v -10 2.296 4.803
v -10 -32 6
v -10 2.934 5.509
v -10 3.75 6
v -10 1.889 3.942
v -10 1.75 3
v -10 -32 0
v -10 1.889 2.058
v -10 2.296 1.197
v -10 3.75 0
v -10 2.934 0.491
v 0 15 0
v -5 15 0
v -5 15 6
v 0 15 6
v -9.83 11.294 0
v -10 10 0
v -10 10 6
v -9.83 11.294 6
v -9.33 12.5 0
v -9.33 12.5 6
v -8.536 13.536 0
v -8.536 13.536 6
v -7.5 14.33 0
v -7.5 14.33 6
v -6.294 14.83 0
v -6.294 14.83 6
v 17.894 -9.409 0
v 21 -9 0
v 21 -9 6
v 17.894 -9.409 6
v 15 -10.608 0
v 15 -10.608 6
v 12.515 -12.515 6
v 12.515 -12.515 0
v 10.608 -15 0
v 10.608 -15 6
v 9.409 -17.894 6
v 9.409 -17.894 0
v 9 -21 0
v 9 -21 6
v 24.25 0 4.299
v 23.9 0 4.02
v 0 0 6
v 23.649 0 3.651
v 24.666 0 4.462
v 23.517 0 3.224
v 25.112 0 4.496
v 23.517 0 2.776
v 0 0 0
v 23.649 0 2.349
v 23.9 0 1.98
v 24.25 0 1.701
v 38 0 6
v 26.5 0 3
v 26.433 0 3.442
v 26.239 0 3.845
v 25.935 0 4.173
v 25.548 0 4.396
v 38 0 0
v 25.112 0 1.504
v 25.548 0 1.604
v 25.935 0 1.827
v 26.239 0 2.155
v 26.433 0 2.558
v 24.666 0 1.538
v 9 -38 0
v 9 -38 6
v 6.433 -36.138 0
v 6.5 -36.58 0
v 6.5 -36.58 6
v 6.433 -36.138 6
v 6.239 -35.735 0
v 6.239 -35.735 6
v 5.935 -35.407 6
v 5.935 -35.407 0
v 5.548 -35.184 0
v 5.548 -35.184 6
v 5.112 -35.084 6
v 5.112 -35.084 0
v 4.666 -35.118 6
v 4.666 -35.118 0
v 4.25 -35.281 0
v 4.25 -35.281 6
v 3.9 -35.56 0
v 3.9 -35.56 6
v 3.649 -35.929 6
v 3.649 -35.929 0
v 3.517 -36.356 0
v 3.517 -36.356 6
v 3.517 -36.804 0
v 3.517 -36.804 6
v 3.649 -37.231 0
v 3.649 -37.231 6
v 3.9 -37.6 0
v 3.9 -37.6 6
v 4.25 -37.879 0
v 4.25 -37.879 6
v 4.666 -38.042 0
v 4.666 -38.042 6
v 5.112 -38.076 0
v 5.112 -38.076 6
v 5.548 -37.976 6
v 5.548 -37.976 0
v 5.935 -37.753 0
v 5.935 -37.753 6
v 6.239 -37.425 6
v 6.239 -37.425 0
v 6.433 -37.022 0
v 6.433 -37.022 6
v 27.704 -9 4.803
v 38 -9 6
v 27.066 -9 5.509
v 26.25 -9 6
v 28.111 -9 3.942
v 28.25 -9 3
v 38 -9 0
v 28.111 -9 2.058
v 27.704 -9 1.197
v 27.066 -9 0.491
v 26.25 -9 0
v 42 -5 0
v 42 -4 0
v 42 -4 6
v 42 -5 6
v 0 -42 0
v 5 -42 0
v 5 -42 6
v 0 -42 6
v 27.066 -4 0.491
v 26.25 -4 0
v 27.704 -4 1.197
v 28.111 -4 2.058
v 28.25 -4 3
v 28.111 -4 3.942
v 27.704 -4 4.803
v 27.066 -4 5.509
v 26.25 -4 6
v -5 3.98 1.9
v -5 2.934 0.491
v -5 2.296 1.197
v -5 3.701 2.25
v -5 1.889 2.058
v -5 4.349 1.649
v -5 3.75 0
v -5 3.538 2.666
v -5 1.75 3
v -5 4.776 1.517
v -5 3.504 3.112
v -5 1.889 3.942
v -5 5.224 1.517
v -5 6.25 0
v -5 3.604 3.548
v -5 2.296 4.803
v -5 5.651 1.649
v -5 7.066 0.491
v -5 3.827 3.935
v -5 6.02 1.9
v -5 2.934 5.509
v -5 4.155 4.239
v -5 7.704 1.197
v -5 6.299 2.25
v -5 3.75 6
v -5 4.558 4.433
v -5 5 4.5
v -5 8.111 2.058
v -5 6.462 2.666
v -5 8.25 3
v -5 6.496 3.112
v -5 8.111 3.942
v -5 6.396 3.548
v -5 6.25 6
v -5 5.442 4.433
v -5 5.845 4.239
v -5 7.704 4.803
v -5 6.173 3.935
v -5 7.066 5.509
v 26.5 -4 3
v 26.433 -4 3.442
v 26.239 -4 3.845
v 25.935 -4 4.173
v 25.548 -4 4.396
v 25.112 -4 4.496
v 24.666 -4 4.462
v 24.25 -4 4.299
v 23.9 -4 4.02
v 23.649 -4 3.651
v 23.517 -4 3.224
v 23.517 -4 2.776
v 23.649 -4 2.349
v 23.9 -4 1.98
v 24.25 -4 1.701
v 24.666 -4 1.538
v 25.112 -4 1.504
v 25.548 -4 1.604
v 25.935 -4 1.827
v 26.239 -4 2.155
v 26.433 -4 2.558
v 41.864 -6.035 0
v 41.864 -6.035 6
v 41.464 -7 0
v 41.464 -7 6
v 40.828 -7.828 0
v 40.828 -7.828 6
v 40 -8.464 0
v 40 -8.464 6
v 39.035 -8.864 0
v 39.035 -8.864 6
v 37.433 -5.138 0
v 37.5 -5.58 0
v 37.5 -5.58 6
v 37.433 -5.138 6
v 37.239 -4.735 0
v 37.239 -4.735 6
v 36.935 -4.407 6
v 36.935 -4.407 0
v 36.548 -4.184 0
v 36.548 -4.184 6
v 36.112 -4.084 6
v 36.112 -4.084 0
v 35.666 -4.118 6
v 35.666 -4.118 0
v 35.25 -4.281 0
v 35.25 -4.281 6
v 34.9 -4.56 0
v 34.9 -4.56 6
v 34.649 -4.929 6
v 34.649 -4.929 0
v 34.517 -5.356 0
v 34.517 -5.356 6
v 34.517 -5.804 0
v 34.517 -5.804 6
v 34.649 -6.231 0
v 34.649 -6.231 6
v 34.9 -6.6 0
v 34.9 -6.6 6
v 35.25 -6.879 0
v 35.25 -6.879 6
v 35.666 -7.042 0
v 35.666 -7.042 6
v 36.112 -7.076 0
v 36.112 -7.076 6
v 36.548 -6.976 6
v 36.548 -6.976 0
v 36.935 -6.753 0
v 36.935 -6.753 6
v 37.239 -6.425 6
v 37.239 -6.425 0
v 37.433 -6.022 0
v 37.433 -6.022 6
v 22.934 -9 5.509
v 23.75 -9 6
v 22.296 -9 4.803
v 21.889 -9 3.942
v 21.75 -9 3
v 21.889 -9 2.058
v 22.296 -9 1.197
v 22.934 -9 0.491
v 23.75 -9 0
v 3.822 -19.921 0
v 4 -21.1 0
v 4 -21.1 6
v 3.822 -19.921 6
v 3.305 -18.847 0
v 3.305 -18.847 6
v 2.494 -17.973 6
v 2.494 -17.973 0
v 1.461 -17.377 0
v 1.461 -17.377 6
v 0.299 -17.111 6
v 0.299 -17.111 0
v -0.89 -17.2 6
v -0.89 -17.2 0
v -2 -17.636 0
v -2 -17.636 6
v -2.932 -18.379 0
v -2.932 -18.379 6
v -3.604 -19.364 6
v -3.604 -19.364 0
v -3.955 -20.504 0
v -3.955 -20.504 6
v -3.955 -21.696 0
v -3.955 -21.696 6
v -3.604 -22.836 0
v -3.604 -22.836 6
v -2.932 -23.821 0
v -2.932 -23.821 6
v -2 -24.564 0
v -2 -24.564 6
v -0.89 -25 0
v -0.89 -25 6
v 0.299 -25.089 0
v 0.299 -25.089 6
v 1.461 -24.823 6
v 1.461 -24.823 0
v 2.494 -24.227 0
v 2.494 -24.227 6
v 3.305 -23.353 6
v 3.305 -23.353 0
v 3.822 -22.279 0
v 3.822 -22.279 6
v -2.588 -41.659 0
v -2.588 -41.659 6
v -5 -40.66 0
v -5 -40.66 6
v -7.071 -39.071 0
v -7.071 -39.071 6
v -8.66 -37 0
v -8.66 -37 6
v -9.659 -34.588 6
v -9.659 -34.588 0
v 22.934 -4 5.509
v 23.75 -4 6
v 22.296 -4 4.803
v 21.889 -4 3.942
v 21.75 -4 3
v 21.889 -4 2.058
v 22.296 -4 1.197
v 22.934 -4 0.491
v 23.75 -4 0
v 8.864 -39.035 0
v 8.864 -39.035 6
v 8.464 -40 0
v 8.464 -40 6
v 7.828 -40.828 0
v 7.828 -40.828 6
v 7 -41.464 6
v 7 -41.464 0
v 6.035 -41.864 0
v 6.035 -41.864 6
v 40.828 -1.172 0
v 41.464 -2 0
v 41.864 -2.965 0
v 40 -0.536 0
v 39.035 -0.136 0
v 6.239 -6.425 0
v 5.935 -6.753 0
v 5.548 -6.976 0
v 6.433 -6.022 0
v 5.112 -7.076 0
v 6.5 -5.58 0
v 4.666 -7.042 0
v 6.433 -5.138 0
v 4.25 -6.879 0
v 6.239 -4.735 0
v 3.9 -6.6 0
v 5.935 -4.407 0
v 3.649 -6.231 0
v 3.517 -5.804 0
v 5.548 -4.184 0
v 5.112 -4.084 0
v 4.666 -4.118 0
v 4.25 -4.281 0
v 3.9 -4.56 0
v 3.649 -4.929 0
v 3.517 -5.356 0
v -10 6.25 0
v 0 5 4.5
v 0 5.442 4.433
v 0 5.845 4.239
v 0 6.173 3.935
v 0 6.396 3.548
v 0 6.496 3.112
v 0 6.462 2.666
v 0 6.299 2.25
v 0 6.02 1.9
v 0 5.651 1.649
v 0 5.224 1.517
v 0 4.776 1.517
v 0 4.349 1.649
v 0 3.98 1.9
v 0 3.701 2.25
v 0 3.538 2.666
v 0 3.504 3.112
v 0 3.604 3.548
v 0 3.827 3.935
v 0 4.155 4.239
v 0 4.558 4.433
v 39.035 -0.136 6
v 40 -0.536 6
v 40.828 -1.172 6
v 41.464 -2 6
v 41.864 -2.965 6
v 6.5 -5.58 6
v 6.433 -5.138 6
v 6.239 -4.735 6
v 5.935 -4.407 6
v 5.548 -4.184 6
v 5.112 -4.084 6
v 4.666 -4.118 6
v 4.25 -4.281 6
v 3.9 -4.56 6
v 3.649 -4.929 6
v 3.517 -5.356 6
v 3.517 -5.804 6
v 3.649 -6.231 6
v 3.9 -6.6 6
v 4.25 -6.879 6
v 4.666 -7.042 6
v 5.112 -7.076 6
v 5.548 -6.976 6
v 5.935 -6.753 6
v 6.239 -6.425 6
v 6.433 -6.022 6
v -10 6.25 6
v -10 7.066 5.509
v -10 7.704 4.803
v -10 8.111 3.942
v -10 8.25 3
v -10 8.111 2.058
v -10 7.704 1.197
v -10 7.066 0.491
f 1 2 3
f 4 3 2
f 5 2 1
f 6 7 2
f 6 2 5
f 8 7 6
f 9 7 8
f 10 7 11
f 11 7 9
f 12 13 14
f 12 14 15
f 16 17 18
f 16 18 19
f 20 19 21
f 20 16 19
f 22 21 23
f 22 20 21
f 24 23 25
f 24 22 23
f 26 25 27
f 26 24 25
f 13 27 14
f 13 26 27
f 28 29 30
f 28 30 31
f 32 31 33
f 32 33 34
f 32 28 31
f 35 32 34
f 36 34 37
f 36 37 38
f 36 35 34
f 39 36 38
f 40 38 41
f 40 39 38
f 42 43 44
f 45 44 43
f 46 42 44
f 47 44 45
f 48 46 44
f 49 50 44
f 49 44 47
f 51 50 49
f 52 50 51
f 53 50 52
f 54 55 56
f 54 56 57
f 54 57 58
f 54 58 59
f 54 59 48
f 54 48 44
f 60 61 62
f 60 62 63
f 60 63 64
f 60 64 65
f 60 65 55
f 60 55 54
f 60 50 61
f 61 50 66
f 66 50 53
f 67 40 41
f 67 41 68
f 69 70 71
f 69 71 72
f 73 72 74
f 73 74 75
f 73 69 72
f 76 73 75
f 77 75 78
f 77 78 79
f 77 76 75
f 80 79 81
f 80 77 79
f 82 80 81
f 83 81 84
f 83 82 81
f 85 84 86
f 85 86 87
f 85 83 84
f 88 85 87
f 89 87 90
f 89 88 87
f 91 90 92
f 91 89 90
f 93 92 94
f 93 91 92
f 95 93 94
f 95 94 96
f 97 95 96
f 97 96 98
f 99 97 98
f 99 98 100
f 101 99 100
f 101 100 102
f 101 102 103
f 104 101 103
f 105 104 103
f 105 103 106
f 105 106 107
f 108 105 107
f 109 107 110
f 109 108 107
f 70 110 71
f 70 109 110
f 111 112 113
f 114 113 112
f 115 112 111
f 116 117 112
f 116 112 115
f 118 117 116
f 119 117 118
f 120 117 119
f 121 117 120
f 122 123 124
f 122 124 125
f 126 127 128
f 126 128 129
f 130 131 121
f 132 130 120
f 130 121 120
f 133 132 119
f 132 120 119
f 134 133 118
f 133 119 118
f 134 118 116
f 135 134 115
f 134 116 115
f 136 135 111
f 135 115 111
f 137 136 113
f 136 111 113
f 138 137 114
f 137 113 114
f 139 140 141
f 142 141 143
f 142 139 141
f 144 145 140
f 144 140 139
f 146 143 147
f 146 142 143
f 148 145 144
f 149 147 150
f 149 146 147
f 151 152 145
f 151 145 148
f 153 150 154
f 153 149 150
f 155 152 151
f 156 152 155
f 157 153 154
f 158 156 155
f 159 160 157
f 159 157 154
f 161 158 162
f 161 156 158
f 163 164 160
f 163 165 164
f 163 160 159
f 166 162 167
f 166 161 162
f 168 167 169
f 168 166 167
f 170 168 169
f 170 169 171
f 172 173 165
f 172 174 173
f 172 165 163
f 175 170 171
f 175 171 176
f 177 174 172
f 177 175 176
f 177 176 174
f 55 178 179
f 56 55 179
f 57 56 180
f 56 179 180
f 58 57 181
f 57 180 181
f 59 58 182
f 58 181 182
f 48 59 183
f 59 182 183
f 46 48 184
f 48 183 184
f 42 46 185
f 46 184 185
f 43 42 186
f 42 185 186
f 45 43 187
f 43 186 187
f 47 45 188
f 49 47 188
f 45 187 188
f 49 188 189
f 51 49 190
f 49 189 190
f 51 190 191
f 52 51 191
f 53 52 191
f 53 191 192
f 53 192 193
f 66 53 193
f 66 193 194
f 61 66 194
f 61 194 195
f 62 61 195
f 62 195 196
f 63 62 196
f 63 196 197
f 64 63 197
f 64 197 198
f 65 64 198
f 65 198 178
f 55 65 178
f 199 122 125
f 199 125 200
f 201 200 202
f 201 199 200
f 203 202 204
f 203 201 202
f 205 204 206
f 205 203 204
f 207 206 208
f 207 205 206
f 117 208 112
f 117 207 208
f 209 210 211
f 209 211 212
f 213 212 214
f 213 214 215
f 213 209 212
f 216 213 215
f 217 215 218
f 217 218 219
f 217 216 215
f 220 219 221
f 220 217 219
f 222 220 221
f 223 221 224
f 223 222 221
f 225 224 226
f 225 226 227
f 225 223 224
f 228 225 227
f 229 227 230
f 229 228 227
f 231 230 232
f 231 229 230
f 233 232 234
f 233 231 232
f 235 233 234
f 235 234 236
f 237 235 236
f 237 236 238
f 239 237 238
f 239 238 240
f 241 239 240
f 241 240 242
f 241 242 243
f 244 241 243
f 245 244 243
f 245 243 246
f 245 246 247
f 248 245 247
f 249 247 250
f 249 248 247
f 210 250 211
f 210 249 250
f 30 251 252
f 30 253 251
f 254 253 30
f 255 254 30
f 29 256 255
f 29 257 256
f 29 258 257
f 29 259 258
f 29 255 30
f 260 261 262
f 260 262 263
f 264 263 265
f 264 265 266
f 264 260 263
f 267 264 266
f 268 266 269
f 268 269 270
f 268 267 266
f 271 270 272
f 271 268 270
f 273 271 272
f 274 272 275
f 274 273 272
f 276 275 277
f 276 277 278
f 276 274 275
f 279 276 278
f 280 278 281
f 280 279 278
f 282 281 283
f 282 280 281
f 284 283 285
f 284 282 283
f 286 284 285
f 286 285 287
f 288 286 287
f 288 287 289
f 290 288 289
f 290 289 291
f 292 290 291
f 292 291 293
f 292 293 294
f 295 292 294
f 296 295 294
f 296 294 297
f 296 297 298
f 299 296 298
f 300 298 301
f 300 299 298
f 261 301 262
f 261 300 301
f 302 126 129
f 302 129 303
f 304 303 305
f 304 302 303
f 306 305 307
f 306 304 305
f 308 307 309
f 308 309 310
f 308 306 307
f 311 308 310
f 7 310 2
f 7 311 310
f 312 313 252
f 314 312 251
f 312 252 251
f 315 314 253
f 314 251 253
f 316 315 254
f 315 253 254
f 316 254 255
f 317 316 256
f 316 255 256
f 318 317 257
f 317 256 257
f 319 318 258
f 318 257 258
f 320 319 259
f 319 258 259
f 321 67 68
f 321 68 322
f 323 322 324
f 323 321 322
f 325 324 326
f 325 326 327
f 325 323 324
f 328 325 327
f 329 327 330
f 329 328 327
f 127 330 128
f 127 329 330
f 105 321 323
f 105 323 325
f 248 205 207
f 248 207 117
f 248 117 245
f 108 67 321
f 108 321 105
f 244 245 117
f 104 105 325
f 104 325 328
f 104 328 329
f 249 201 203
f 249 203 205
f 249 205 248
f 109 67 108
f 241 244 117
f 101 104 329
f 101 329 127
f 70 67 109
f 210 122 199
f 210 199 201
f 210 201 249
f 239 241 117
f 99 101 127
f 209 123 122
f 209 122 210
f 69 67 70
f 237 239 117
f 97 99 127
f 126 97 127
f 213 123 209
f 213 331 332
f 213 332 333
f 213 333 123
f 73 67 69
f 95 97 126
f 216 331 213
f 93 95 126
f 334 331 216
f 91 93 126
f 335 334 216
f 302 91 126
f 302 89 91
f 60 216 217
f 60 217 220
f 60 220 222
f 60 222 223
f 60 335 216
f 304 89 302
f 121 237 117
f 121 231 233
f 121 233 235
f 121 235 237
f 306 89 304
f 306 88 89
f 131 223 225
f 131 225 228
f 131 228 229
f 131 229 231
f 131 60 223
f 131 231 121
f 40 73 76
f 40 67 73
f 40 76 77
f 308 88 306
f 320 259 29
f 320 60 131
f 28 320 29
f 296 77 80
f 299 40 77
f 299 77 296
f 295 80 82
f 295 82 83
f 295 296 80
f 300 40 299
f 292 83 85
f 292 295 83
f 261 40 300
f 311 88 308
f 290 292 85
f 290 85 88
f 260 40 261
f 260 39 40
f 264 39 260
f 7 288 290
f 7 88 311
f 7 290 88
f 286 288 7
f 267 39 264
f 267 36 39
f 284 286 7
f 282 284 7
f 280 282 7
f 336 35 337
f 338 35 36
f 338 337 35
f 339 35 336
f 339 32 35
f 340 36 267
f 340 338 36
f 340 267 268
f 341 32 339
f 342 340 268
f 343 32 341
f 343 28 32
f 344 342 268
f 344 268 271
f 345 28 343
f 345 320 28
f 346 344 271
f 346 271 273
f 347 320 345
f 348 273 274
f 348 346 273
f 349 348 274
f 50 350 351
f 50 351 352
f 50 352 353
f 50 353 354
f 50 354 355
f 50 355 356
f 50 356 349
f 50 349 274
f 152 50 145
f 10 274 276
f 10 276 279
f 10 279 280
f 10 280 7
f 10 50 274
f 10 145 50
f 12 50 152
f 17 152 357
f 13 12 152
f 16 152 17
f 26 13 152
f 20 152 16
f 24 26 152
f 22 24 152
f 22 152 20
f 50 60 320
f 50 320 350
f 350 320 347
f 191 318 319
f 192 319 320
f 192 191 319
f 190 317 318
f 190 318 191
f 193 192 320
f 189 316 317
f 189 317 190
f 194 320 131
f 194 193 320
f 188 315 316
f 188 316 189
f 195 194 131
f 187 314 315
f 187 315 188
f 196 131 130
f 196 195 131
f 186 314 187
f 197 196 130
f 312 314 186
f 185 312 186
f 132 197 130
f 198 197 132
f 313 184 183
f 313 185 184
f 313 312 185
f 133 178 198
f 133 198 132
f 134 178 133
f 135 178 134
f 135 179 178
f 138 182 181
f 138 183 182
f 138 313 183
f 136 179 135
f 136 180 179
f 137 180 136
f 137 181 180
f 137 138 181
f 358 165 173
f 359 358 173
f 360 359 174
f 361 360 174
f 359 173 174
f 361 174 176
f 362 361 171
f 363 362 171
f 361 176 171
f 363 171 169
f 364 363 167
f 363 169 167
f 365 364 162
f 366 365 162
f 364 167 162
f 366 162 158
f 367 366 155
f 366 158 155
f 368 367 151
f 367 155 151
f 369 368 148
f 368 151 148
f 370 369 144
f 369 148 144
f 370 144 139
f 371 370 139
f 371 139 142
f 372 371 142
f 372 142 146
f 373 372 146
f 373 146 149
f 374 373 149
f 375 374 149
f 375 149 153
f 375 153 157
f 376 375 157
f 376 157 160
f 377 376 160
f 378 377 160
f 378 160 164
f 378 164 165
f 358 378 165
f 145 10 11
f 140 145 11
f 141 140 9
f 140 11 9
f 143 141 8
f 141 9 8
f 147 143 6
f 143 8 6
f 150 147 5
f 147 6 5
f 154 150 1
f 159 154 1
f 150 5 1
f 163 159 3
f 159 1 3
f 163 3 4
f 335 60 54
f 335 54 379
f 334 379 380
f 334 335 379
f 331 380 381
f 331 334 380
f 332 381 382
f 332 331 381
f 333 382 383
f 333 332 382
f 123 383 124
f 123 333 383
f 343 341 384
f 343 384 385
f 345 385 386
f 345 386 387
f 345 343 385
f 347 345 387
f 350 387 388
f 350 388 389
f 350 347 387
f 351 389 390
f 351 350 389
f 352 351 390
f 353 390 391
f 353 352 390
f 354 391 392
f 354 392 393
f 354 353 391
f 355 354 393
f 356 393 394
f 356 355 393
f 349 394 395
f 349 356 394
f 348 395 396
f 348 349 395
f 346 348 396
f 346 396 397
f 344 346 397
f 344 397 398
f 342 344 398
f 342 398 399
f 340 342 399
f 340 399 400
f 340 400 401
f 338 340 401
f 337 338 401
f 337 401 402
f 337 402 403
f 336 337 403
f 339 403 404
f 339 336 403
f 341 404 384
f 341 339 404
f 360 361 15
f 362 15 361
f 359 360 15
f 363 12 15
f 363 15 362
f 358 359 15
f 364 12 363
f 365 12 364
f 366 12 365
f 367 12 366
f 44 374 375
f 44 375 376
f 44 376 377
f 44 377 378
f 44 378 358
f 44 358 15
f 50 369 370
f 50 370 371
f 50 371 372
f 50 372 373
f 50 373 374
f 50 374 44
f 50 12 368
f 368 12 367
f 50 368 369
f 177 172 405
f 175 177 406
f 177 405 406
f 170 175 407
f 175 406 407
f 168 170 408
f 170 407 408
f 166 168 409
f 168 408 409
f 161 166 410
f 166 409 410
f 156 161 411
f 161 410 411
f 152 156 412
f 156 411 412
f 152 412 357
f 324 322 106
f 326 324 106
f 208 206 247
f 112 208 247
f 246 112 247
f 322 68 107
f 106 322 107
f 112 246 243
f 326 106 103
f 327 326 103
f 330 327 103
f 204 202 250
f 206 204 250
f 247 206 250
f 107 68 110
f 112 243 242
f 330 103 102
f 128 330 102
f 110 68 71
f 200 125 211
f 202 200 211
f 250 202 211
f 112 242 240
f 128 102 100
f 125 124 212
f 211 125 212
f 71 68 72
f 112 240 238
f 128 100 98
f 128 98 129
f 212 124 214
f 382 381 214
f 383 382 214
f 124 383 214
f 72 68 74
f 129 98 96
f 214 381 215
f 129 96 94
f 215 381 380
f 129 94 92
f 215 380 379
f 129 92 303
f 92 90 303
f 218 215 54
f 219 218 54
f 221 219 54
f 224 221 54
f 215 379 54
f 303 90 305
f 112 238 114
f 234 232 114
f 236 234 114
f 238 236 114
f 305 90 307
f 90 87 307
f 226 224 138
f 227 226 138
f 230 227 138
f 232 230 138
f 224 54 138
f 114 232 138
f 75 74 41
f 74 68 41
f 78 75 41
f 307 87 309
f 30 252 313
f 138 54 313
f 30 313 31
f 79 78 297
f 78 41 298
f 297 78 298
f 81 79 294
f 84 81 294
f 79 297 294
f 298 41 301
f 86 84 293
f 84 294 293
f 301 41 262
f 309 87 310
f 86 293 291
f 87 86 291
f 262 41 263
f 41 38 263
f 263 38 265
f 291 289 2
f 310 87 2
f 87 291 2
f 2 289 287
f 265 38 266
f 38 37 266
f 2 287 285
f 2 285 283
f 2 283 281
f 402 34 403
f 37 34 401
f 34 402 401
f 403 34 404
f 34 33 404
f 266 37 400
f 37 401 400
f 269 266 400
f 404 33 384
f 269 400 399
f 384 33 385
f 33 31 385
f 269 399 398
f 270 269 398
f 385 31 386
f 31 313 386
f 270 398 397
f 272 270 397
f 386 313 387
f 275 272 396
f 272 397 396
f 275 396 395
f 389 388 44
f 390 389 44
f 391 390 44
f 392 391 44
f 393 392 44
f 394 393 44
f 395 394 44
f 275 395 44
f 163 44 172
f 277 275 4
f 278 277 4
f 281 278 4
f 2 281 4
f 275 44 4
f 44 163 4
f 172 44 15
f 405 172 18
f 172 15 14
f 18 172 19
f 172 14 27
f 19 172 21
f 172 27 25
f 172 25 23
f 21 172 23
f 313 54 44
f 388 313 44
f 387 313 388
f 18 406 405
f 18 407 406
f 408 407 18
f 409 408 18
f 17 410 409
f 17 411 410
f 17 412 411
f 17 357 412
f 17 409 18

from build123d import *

# Parameters (mm, degrees)
CROQUIS1_R              = 1.5
CROQUIS1_R_2            = 4
SALIENTE_EXTRUIR1_DEPTH = 6
CROQUIS4_R              = 1.5
CORTAR_EXTRUIR3_DEPTH   = 54.749418602
CROQUIS5_R              = 1.5
CORTAR_EXTRUIR4_DEPTH   = 68.111846942
CROQUIS6_R              = 3.25
CORTAR_EXTRUIR5_DEPTH   = 5
CROQUIS7_R              = 3.25
CORTAR_EXTRUIR6_DEPTH   = 5


with BuildPart() as part:
    # Croquis1 → Saliente-Extruir1 (new body)
    with BuildSketch(Plane.XY):
        with BuildLine():
            Line((0, 0), (38, 0))
            ThreePointArc((38, 0), (40.828427125, -1.171572875), (42, -4))
            Line((42, -4), (42, -5))
            ThreePointArc((42, -5), (40.828427125, -7.828427125), (38, -9))
            Line((38, -9), (21, -9))
            ThreePointArc((21, -9), (12.514718626, -12.514718626), (9, -21))
            Line((9, -21), (9, -38))
            ThreePointArc((9, -38), (7.828427125, -40.828427125), (5, -42))
            Line((5, -42), (0, -42))
            ThreePointArc((0, -42), (-7.071067812, -39.071067812), (-10, -32))
            Line((-10, -32), (-10, 10))
            ThreePointArc((-10, 10), (-8.535533906, 13.535533906), (-5, 15))
            Line((-5, 15), (0, 15))
            Line((0, 15), (0, 0))
        make_face()
        with Locations((36, -5.58)):
            Circle(CROQUIS1_R, mode=Mode.SUBTRACT)
        with Locations((5, -5.58)):
            Circle(CROQUIS1_R, mode=Mode.SUBTRACT)
        with Locations((5, -36.58)):
            Circle(CROQUIS1_R, mode=Mode.SUBTRACT)
        with Locations((0, -21.1)):
            Circle(CROQUIS1_R_2, mode=Mode.SUBTRACT)
    extrude(amount=SALIENTE_EXTRUIR1_DEPTH)

    # Croquis4 → Cortar-Extruir3 (cut, through all)
    with BuildSketch(Plane.XZ.offset(9)):
        with Locations((25, 3)):
            Circle(CROQUIS4_R)
    extrude(amount=-CORTAR_EXTRUIR3_DEPTH, mode=Mode.SUBTRACT)

    # Croquis5 → Cortar-Extruir4 (cut, through all)
    with BuildSketch(Plane.ZY.offset(10)):
        with Locations((3, 5)):
            Circle(CROQUIS5_R)
    extrude(amount=-CORTAR_EXTRUIR4_DEPTH, mode=Mode.SUBTRACT)

    # Croquis6 → Cortar-Extruir5 (cut)
    with BuildSketch(Plane.XZ.offset(9)):
        with Locations((25, 3)):
            Circle(CROQUIS6_R)
    extrude(amount=-CORTAR_EXTRUIR5_DEPTH, mode=Mode.SUBTRACT)

    # Croquis7 → Cortar-Extruir6 (cut)
    with BuildSketch(Plane.ZY.offset(10)):
        with Locations((3, 5)):
            Circle(CROQUIS7_R)
    extrude(amount=-CORTAR_EXTRUIR6_DEPTH, mode=Mode.SUBTRACT)


solid = part.part
